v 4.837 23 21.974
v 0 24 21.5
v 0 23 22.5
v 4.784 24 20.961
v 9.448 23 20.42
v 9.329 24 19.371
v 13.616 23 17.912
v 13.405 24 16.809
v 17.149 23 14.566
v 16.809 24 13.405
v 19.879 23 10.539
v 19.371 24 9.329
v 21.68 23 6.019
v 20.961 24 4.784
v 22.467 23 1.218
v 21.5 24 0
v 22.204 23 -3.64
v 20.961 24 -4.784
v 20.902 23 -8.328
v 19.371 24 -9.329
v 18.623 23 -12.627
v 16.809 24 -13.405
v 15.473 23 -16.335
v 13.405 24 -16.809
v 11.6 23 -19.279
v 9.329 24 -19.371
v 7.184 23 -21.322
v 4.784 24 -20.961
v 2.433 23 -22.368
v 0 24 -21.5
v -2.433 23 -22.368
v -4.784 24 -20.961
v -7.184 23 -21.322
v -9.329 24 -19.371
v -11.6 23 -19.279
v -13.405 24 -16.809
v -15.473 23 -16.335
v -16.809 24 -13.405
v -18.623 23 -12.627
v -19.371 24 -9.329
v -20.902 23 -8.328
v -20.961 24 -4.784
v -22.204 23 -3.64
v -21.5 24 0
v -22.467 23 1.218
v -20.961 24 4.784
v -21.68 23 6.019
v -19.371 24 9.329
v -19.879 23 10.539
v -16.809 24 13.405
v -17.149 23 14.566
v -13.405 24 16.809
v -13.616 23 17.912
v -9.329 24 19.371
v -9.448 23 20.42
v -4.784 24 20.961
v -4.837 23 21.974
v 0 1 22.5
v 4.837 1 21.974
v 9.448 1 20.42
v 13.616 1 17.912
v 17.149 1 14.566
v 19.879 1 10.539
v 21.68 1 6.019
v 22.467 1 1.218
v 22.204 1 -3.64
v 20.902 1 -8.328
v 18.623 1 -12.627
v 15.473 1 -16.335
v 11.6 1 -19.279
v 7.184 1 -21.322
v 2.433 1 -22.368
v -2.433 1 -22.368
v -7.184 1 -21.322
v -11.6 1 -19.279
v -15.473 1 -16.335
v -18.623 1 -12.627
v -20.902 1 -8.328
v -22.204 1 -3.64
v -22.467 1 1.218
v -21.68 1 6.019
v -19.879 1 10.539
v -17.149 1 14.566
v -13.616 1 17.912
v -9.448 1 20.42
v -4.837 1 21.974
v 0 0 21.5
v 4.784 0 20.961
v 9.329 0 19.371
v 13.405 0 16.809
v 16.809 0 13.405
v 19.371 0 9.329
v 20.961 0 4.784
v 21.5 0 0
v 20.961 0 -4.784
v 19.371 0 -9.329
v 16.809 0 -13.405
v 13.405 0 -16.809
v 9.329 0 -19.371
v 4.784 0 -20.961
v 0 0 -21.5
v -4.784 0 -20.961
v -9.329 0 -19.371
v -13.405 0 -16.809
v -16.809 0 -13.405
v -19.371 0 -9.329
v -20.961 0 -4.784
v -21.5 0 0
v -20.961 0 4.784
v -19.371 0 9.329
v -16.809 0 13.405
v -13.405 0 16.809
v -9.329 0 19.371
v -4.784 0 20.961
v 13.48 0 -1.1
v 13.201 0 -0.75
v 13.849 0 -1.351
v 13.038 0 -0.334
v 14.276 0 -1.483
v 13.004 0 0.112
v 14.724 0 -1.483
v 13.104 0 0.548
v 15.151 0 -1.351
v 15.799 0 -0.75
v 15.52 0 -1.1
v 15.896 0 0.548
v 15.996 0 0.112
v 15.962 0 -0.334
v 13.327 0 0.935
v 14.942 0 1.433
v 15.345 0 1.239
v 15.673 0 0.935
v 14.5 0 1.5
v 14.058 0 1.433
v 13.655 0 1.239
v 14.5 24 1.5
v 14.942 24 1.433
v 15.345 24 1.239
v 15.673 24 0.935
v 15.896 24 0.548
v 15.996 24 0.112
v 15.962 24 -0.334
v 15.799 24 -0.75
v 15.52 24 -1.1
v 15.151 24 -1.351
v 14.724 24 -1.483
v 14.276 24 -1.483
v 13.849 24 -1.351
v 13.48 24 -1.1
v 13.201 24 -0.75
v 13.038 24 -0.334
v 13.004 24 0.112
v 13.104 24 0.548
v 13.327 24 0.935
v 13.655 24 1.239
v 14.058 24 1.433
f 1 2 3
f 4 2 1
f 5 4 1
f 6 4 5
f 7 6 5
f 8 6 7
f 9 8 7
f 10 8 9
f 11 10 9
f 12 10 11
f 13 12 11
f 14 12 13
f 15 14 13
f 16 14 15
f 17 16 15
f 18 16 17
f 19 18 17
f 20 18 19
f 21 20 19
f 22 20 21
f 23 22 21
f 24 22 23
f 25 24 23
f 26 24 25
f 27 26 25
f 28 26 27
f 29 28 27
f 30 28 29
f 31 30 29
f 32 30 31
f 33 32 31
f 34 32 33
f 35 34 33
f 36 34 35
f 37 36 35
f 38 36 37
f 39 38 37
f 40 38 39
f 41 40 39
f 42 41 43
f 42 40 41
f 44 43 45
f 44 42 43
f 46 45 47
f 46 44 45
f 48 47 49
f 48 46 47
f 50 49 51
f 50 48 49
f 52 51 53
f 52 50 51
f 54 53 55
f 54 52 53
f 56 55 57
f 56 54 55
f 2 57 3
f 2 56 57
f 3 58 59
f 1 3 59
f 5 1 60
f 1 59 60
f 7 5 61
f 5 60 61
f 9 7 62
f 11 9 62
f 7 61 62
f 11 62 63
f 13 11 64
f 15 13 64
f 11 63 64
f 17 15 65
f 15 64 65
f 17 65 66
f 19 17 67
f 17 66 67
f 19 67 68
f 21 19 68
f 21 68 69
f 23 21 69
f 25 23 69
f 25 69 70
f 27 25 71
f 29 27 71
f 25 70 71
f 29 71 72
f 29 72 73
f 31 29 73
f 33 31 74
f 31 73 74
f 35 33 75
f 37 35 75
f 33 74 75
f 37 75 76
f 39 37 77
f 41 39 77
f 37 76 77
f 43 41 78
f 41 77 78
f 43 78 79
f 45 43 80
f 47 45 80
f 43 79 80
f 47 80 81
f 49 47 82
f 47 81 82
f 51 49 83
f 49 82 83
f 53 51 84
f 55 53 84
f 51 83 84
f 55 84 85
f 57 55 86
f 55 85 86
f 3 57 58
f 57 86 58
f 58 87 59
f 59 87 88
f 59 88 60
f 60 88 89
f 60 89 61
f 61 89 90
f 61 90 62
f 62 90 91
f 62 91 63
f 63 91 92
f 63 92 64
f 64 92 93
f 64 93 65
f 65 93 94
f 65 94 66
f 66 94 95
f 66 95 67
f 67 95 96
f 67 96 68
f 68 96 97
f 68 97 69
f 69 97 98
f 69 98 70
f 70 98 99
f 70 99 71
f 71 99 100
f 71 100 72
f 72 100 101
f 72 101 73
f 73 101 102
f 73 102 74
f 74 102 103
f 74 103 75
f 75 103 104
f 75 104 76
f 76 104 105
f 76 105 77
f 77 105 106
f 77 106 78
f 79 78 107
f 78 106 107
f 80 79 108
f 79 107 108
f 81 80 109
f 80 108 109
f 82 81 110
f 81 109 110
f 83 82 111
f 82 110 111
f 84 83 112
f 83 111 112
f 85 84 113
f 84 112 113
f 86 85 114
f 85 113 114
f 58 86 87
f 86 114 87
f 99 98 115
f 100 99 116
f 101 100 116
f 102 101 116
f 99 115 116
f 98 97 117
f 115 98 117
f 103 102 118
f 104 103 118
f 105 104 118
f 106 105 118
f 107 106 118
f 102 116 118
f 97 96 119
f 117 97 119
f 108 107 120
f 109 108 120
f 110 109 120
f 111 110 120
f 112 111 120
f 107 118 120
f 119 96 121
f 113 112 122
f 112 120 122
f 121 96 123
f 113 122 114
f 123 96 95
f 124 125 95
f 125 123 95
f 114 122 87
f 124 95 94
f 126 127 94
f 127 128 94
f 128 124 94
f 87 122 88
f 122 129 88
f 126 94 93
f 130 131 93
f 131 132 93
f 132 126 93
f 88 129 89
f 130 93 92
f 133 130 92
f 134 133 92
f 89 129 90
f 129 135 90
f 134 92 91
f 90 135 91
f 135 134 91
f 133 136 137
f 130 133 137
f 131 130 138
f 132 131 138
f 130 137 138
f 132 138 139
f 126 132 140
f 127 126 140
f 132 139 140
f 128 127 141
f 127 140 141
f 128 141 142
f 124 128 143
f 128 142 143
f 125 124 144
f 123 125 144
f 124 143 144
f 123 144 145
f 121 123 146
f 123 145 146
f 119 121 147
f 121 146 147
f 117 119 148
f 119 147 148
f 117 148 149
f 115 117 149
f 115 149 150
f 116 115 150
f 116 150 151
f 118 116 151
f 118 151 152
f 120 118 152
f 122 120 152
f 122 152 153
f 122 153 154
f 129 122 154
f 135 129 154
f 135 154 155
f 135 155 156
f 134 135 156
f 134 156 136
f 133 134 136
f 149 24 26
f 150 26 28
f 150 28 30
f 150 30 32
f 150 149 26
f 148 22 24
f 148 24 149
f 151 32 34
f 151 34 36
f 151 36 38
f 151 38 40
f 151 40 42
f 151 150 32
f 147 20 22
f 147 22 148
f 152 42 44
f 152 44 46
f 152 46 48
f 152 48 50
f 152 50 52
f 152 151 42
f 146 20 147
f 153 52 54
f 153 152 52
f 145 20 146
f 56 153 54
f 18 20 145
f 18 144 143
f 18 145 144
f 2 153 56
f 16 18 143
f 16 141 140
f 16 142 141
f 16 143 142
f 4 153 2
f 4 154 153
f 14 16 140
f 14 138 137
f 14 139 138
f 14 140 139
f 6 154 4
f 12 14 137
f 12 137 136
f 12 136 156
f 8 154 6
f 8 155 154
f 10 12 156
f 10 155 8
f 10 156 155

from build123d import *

# Parameters (mm, degrees)
SKETCH1_R           = 22.5
BOSS_EXTRUDE1_DEPTH = 24
CHAMFER1_SIZE       = 1
SKETCH2_R           = 1.5
CUT_EXTRUDE1_DEPTH  = 40.855990767


with BuildPart() as part:
    # Sketch1 → Boss-Extrude1 (new body)
    with BuildSketch(Plane(origin=(0, 0, 0), x_dir=(1, 0, 0), z_dir=(0, 1, 0))):
        with Locations(Location((0, 0, 0), (0, 0, 270))):
            Circle(SKETCH1_R)
    extrude(amount=BOSS_EXTRUDE1_DEPTH)

    # Chamfer1
    chamfer1_edges = [part.edges().sort_by_distance(p)[0] for p in [
        (0, 0, -22.5),
        (0, 24, -22.5),
    ]]
    chamfer(chamfer1_edges, length=CHAMFER1_SIZE)

    # Sketch2 → Cut-Extrude1 (cut, through all)
    with BuildSketch(Plane(origin=(0, 24, 0), x_dir=(1, 0, 0), z_dir=(0, 1, 0))):
        with Locations(Location((14.5, 0, 0), (0, 0, 270))):
            Circle(SKETCH2_R)
    extrude(amount=-CUT_EXTRUDE1_DEPTH, mode=Mode.SUBTRACT)


solid = part.part
